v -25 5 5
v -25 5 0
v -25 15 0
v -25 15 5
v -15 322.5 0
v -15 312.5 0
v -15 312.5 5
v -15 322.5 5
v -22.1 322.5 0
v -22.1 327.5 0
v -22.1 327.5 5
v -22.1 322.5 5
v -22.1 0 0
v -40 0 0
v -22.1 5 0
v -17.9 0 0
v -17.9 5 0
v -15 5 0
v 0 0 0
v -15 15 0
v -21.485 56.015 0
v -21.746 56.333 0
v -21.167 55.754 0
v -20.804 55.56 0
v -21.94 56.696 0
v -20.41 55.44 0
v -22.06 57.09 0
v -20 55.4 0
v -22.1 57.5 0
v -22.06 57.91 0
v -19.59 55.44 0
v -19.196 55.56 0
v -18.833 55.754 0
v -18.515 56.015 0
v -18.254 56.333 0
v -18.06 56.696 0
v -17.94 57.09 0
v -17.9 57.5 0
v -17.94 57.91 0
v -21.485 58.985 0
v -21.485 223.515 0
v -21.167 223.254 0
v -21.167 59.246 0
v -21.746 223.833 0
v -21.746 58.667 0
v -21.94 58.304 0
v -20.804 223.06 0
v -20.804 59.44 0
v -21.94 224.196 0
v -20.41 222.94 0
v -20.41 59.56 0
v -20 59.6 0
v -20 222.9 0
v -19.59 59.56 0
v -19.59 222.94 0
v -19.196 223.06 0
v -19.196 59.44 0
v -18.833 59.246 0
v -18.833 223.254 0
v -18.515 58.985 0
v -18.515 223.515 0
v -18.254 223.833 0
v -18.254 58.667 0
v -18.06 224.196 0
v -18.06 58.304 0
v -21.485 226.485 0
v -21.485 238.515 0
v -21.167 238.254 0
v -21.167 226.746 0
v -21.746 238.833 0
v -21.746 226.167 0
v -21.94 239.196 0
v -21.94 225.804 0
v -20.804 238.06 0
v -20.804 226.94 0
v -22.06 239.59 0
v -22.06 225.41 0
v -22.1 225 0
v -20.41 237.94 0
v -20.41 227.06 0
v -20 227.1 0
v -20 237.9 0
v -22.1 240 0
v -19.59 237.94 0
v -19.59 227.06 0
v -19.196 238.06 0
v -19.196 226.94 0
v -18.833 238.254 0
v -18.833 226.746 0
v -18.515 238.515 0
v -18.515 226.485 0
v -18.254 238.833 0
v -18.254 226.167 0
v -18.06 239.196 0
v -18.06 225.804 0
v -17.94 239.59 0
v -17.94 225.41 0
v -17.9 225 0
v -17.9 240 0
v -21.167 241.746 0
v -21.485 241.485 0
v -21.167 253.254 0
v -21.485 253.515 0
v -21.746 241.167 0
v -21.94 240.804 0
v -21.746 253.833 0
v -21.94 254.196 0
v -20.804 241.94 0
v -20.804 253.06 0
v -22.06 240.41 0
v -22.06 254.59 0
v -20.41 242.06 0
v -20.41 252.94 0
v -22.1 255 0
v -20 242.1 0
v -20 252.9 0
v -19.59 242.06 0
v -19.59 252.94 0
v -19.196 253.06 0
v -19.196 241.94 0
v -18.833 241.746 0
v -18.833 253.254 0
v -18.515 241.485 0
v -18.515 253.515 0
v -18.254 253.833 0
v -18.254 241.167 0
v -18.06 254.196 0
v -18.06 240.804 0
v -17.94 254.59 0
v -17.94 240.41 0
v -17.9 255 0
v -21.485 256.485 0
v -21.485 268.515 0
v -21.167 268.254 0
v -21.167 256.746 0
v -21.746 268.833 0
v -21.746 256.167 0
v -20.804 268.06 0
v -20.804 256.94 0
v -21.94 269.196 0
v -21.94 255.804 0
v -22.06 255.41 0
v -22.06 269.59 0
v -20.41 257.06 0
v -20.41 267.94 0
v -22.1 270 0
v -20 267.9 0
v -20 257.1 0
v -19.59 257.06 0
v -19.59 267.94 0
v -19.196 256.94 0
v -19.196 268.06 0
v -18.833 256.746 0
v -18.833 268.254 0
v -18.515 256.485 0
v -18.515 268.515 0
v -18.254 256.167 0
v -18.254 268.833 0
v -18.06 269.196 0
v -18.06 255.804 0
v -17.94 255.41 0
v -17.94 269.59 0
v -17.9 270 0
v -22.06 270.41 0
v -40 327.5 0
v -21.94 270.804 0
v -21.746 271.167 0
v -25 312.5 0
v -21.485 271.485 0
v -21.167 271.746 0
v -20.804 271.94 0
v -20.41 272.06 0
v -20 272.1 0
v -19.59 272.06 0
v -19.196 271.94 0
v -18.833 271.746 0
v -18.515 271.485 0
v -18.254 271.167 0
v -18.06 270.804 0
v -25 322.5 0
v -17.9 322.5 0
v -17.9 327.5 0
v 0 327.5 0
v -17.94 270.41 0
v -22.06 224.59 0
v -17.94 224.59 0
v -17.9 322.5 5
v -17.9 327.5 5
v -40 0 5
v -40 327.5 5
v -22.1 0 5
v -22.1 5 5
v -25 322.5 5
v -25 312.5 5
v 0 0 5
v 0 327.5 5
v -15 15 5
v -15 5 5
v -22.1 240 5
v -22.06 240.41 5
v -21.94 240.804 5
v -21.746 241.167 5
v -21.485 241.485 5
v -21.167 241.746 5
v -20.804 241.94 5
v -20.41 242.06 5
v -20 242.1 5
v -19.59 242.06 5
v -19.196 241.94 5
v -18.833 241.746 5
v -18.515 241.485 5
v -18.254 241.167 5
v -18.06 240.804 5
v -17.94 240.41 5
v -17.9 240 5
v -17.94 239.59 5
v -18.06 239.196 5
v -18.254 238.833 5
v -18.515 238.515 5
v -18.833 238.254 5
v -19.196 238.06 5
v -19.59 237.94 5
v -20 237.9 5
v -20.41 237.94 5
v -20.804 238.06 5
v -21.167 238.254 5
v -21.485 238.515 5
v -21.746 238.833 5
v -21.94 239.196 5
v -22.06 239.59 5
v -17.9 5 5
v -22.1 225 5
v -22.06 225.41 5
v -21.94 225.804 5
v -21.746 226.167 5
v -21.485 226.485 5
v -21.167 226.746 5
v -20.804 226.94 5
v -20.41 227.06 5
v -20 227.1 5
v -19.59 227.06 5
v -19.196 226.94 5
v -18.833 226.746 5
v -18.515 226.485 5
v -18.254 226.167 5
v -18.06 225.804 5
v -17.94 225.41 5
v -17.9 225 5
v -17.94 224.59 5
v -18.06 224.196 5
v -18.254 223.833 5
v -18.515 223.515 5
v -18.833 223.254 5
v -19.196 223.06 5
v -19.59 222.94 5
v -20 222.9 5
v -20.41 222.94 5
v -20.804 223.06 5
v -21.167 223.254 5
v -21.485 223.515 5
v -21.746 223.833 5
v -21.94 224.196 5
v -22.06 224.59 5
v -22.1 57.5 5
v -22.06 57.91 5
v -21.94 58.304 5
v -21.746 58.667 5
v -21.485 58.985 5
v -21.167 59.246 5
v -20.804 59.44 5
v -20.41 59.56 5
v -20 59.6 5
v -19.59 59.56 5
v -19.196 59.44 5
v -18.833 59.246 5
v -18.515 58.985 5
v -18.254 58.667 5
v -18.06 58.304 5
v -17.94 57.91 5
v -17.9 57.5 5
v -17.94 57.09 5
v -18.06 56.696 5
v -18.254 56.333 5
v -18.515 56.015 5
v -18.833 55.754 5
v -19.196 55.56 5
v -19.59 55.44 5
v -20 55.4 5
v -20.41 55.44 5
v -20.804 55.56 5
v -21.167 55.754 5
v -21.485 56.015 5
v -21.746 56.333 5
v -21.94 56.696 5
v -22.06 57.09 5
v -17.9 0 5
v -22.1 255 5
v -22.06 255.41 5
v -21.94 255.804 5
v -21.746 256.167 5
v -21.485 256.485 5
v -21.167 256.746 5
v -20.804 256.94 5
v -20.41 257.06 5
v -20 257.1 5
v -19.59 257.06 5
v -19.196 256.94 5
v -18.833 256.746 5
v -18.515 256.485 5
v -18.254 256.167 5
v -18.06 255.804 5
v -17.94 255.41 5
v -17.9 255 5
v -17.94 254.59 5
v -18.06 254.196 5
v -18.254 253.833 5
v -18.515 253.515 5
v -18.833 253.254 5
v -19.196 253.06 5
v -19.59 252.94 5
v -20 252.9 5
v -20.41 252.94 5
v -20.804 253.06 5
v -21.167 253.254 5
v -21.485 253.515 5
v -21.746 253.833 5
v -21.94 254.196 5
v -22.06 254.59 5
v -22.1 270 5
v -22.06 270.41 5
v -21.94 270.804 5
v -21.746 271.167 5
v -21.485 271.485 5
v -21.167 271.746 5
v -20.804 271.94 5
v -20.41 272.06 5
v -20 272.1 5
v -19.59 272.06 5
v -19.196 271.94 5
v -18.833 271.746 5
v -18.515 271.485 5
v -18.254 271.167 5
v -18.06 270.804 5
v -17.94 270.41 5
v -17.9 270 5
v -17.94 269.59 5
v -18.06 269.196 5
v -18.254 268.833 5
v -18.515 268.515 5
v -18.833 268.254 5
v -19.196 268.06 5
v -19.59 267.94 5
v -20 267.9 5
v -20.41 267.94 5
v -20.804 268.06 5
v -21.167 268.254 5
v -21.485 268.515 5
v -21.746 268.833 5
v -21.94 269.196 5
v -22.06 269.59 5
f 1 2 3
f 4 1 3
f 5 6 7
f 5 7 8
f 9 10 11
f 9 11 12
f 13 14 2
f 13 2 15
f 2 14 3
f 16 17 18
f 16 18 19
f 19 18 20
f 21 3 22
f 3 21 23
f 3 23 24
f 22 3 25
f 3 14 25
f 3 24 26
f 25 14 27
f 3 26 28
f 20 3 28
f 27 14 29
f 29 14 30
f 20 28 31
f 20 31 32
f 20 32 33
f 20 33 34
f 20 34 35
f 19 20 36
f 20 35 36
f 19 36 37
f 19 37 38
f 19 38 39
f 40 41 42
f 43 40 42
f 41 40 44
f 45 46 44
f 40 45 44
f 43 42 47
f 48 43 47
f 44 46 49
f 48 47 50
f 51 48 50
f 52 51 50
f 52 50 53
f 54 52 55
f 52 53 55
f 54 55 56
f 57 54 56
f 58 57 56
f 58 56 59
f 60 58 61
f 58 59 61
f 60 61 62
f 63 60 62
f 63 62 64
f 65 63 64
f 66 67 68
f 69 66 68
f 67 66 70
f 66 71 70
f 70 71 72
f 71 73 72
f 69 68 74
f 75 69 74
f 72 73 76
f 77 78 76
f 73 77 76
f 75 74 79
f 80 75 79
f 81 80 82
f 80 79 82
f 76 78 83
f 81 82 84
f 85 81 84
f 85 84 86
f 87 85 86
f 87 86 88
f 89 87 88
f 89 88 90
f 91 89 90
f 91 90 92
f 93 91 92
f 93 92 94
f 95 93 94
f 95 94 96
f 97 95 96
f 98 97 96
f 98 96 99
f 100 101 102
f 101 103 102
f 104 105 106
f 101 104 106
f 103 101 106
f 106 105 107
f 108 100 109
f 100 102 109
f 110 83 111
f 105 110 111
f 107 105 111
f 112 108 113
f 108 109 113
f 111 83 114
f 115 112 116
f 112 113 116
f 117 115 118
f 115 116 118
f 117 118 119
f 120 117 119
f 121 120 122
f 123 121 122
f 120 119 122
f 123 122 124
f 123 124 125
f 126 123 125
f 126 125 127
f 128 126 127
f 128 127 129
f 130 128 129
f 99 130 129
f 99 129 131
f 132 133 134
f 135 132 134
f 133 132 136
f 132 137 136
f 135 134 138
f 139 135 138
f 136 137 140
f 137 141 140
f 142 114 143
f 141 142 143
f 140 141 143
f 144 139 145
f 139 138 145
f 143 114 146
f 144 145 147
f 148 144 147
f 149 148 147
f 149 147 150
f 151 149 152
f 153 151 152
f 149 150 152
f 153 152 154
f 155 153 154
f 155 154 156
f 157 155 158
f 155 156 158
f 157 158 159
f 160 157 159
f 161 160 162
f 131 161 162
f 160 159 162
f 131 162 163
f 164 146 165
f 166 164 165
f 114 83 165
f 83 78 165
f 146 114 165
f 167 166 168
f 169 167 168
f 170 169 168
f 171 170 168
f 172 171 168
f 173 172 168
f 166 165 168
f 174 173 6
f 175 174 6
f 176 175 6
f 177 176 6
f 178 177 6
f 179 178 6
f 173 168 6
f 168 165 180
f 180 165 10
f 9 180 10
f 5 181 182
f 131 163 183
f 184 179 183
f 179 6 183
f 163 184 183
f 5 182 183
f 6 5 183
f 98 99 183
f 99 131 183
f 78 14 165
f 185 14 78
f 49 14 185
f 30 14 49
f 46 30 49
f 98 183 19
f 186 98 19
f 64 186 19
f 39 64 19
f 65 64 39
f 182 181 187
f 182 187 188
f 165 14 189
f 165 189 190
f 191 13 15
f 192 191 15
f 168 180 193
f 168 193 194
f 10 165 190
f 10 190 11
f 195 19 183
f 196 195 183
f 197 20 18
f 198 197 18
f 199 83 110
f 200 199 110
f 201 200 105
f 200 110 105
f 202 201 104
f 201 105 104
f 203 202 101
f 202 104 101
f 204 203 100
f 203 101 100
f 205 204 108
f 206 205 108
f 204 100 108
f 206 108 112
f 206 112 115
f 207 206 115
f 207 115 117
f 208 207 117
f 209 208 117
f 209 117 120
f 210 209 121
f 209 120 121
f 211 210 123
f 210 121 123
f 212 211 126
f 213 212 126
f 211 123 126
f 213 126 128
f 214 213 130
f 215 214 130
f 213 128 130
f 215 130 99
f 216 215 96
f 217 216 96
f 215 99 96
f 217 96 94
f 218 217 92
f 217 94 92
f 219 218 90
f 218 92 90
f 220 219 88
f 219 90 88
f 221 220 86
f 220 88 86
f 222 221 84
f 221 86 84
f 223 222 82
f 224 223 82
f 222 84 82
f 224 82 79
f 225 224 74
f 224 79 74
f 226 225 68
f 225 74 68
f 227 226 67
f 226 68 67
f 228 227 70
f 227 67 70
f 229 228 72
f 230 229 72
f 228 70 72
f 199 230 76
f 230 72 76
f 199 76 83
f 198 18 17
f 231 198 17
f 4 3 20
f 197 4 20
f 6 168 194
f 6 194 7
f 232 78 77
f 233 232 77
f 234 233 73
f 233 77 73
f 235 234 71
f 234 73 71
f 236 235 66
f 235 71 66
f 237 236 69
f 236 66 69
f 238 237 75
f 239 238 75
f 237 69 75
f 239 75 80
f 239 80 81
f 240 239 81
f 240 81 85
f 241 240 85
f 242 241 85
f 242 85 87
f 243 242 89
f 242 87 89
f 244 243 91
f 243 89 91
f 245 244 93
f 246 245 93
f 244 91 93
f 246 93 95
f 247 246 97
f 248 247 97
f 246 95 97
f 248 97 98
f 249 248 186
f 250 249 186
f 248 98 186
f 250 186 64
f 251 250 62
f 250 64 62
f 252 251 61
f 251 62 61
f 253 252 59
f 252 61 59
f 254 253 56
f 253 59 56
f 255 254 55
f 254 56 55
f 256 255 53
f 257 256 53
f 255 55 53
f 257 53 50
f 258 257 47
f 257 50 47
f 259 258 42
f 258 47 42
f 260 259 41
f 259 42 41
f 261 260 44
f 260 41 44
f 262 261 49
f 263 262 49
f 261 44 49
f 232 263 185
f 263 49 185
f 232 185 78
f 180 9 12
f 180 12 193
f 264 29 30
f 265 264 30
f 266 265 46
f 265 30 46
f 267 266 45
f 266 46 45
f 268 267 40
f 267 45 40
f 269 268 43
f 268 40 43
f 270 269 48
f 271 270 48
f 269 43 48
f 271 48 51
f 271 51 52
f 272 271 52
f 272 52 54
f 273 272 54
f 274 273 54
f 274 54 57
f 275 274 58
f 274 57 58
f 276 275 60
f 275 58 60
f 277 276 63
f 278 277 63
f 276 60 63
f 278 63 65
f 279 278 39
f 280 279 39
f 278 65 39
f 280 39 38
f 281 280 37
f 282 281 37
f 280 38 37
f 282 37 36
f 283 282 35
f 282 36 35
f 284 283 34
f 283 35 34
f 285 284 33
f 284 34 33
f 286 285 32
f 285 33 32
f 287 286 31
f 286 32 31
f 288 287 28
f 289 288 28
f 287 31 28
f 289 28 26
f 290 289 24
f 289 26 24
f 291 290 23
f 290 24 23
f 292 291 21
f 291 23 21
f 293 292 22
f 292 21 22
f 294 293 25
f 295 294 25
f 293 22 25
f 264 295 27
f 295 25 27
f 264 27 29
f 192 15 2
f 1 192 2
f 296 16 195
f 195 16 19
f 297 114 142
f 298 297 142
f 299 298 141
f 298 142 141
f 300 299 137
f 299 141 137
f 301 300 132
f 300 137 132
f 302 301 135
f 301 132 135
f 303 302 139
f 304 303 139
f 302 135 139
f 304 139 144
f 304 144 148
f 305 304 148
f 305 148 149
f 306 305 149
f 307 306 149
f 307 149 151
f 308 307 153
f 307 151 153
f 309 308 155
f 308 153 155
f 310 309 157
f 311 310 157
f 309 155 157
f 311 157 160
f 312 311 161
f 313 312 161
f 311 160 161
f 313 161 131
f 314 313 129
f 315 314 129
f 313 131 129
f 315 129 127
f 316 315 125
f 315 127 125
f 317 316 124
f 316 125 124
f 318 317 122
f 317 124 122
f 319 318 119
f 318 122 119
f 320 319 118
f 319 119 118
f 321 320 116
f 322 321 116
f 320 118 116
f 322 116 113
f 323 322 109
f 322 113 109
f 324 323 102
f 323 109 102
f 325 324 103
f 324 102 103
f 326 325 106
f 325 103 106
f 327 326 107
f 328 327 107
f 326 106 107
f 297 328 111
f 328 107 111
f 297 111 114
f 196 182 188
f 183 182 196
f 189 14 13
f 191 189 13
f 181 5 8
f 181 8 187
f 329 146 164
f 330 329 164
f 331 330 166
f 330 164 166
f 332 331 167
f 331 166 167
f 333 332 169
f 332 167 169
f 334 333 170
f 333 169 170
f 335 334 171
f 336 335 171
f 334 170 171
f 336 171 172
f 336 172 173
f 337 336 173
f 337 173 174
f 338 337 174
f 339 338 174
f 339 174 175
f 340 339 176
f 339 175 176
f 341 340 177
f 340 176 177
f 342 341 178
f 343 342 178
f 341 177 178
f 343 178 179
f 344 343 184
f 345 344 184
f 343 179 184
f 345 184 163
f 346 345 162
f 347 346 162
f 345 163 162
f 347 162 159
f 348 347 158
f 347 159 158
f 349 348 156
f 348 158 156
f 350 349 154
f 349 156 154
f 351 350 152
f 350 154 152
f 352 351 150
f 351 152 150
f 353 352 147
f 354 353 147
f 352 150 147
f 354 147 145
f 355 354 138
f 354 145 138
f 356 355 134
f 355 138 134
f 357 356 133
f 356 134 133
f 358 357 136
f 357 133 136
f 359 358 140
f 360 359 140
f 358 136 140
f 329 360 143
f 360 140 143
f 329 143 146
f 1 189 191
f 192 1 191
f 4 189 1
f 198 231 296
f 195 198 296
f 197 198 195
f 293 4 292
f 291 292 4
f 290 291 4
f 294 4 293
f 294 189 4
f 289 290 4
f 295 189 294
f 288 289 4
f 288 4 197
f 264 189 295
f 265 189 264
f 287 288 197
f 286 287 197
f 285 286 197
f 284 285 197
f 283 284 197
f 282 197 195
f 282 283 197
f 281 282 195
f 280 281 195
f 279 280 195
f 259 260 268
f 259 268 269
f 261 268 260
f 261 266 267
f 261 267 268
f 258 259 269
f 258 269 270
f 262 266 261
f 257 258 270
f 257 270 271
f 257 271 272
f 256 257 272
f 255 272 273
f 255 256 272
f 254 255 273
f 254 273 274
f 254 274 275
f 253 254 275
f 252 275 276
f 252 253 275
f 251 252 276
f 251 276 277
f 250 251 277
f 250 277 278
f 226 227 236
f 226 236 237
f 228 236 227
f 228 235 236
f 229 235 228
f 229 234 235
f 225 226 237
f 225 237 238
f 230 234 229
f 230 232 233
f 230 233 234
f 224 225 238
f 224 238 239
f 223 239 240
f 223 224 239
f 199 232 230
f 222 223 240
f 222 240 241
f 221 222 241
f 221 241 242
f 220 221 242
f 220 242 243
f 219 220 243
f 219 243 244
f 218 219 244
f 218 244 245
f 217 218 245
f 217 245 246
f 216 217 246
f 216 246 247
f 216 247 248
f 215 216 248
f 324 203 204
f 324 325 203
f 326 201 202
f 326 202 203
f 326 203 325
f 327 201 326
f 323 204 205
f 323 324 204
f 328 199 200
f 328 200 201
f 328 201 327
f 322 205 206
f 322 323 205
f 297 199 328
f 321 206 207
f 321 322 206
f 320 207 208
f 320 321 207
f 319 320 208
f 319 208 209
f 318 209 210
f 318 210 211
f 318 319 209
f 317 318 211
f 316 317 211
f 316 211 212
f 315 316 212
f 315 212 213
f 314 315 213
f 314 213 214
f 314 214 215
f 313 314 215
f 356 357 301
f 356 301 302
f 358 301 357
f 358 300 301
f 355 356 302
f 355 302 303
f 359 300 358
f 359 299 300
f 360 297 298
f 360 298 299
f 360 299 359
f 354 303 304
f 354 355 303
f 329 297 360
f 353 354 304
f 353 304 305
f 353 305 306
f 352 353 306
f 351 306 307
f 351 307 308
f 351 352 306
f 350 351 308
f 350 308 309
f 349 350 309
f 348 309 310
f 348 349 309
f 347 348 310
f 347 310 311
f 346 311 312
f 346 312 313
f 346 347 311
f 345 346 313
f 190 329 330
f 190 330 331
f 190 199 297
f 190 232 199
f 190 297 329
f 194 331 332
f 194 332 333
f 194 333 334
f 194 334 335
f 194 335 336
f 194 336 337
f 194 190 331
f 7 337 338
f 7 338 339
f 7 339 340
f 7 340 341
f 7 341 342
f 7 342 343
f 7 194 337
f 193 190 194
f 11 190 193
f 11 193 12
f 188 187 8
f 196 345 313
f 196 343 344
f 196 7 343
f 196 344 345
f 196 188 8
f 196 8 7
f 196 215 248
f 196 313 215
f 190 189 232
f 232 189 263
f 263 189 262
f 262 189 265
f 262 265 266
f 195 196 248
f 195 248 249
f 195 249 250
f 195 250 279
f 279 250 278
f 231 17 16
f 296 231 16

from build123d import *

# Parameters (mm, degrees)
SKETCH1_W           = 40
SKETCH1_H           = 327.5
BOSS_EXTRUDE1_DEPTH = 5
SKETCH2_R           = 2.1
CUT_EXTRUDE1_DEPTH  = 5
CUT_EXTRUDE2_DEPTH  = 5


with BuildPart() as part:
    # Sketch1 → Boss-Extrude1 (new body)
    with BuildSketch(Plane.XY):
        with Locations((-20, 163.75)):
            Rectangle(SKETCH1_W, SKETCH1_H)
    extrude(amount=BOSS_EXTRUDE1_DEPTH)

    # Sketch2 → Cut-Extrude1 (cut)
    with BuildSketch(Plane(origin=(0, 0, 0), x_dir=(-1, 0, 0), z_dir=(0, 0, -1))):
        with Locations((20, 57.5)):
            Circle(SKETCH2_R)
        with Locations((20, 270)):
            Circle(SKETCH2_R)
        with Locations((20, 255)):
            Circle(SKETCH2_R)
        with Locations((20, 240)):
            Circle(SKETCH2_R)
        with Locations((20, 225)):
            Circle(SKETCH2_R)
    extrude(amount=-CUT_EXTRUDE1_DEPTH, mode=Mode.SUBTRACT)

    # Sketch3 → Cut-Extrude2 (cut)
    with BuildSketch(Plane(origin=(0, 0, 0), x_dir=(-1, 0, 0), z_dir=(0, 0, -1))):
        Polygon((17.9, 0), (22.1, 0), (22.1, 5), (25, 5), (25, 15), (15, 15), (15, 5), (17.9, 5), align=None)
    cut_extrude2 = extrude(amount=-CUT_EXTRUDE2_DEPTH, mode=Mode.SUBTRACT)

    # Mirror1: Cut-Extrude2 across plane
    add(cut_extrude2.mirror(Plane.ZX.offset(163.75)), mode=Mode.SUBTRACT)


solid = part.part
